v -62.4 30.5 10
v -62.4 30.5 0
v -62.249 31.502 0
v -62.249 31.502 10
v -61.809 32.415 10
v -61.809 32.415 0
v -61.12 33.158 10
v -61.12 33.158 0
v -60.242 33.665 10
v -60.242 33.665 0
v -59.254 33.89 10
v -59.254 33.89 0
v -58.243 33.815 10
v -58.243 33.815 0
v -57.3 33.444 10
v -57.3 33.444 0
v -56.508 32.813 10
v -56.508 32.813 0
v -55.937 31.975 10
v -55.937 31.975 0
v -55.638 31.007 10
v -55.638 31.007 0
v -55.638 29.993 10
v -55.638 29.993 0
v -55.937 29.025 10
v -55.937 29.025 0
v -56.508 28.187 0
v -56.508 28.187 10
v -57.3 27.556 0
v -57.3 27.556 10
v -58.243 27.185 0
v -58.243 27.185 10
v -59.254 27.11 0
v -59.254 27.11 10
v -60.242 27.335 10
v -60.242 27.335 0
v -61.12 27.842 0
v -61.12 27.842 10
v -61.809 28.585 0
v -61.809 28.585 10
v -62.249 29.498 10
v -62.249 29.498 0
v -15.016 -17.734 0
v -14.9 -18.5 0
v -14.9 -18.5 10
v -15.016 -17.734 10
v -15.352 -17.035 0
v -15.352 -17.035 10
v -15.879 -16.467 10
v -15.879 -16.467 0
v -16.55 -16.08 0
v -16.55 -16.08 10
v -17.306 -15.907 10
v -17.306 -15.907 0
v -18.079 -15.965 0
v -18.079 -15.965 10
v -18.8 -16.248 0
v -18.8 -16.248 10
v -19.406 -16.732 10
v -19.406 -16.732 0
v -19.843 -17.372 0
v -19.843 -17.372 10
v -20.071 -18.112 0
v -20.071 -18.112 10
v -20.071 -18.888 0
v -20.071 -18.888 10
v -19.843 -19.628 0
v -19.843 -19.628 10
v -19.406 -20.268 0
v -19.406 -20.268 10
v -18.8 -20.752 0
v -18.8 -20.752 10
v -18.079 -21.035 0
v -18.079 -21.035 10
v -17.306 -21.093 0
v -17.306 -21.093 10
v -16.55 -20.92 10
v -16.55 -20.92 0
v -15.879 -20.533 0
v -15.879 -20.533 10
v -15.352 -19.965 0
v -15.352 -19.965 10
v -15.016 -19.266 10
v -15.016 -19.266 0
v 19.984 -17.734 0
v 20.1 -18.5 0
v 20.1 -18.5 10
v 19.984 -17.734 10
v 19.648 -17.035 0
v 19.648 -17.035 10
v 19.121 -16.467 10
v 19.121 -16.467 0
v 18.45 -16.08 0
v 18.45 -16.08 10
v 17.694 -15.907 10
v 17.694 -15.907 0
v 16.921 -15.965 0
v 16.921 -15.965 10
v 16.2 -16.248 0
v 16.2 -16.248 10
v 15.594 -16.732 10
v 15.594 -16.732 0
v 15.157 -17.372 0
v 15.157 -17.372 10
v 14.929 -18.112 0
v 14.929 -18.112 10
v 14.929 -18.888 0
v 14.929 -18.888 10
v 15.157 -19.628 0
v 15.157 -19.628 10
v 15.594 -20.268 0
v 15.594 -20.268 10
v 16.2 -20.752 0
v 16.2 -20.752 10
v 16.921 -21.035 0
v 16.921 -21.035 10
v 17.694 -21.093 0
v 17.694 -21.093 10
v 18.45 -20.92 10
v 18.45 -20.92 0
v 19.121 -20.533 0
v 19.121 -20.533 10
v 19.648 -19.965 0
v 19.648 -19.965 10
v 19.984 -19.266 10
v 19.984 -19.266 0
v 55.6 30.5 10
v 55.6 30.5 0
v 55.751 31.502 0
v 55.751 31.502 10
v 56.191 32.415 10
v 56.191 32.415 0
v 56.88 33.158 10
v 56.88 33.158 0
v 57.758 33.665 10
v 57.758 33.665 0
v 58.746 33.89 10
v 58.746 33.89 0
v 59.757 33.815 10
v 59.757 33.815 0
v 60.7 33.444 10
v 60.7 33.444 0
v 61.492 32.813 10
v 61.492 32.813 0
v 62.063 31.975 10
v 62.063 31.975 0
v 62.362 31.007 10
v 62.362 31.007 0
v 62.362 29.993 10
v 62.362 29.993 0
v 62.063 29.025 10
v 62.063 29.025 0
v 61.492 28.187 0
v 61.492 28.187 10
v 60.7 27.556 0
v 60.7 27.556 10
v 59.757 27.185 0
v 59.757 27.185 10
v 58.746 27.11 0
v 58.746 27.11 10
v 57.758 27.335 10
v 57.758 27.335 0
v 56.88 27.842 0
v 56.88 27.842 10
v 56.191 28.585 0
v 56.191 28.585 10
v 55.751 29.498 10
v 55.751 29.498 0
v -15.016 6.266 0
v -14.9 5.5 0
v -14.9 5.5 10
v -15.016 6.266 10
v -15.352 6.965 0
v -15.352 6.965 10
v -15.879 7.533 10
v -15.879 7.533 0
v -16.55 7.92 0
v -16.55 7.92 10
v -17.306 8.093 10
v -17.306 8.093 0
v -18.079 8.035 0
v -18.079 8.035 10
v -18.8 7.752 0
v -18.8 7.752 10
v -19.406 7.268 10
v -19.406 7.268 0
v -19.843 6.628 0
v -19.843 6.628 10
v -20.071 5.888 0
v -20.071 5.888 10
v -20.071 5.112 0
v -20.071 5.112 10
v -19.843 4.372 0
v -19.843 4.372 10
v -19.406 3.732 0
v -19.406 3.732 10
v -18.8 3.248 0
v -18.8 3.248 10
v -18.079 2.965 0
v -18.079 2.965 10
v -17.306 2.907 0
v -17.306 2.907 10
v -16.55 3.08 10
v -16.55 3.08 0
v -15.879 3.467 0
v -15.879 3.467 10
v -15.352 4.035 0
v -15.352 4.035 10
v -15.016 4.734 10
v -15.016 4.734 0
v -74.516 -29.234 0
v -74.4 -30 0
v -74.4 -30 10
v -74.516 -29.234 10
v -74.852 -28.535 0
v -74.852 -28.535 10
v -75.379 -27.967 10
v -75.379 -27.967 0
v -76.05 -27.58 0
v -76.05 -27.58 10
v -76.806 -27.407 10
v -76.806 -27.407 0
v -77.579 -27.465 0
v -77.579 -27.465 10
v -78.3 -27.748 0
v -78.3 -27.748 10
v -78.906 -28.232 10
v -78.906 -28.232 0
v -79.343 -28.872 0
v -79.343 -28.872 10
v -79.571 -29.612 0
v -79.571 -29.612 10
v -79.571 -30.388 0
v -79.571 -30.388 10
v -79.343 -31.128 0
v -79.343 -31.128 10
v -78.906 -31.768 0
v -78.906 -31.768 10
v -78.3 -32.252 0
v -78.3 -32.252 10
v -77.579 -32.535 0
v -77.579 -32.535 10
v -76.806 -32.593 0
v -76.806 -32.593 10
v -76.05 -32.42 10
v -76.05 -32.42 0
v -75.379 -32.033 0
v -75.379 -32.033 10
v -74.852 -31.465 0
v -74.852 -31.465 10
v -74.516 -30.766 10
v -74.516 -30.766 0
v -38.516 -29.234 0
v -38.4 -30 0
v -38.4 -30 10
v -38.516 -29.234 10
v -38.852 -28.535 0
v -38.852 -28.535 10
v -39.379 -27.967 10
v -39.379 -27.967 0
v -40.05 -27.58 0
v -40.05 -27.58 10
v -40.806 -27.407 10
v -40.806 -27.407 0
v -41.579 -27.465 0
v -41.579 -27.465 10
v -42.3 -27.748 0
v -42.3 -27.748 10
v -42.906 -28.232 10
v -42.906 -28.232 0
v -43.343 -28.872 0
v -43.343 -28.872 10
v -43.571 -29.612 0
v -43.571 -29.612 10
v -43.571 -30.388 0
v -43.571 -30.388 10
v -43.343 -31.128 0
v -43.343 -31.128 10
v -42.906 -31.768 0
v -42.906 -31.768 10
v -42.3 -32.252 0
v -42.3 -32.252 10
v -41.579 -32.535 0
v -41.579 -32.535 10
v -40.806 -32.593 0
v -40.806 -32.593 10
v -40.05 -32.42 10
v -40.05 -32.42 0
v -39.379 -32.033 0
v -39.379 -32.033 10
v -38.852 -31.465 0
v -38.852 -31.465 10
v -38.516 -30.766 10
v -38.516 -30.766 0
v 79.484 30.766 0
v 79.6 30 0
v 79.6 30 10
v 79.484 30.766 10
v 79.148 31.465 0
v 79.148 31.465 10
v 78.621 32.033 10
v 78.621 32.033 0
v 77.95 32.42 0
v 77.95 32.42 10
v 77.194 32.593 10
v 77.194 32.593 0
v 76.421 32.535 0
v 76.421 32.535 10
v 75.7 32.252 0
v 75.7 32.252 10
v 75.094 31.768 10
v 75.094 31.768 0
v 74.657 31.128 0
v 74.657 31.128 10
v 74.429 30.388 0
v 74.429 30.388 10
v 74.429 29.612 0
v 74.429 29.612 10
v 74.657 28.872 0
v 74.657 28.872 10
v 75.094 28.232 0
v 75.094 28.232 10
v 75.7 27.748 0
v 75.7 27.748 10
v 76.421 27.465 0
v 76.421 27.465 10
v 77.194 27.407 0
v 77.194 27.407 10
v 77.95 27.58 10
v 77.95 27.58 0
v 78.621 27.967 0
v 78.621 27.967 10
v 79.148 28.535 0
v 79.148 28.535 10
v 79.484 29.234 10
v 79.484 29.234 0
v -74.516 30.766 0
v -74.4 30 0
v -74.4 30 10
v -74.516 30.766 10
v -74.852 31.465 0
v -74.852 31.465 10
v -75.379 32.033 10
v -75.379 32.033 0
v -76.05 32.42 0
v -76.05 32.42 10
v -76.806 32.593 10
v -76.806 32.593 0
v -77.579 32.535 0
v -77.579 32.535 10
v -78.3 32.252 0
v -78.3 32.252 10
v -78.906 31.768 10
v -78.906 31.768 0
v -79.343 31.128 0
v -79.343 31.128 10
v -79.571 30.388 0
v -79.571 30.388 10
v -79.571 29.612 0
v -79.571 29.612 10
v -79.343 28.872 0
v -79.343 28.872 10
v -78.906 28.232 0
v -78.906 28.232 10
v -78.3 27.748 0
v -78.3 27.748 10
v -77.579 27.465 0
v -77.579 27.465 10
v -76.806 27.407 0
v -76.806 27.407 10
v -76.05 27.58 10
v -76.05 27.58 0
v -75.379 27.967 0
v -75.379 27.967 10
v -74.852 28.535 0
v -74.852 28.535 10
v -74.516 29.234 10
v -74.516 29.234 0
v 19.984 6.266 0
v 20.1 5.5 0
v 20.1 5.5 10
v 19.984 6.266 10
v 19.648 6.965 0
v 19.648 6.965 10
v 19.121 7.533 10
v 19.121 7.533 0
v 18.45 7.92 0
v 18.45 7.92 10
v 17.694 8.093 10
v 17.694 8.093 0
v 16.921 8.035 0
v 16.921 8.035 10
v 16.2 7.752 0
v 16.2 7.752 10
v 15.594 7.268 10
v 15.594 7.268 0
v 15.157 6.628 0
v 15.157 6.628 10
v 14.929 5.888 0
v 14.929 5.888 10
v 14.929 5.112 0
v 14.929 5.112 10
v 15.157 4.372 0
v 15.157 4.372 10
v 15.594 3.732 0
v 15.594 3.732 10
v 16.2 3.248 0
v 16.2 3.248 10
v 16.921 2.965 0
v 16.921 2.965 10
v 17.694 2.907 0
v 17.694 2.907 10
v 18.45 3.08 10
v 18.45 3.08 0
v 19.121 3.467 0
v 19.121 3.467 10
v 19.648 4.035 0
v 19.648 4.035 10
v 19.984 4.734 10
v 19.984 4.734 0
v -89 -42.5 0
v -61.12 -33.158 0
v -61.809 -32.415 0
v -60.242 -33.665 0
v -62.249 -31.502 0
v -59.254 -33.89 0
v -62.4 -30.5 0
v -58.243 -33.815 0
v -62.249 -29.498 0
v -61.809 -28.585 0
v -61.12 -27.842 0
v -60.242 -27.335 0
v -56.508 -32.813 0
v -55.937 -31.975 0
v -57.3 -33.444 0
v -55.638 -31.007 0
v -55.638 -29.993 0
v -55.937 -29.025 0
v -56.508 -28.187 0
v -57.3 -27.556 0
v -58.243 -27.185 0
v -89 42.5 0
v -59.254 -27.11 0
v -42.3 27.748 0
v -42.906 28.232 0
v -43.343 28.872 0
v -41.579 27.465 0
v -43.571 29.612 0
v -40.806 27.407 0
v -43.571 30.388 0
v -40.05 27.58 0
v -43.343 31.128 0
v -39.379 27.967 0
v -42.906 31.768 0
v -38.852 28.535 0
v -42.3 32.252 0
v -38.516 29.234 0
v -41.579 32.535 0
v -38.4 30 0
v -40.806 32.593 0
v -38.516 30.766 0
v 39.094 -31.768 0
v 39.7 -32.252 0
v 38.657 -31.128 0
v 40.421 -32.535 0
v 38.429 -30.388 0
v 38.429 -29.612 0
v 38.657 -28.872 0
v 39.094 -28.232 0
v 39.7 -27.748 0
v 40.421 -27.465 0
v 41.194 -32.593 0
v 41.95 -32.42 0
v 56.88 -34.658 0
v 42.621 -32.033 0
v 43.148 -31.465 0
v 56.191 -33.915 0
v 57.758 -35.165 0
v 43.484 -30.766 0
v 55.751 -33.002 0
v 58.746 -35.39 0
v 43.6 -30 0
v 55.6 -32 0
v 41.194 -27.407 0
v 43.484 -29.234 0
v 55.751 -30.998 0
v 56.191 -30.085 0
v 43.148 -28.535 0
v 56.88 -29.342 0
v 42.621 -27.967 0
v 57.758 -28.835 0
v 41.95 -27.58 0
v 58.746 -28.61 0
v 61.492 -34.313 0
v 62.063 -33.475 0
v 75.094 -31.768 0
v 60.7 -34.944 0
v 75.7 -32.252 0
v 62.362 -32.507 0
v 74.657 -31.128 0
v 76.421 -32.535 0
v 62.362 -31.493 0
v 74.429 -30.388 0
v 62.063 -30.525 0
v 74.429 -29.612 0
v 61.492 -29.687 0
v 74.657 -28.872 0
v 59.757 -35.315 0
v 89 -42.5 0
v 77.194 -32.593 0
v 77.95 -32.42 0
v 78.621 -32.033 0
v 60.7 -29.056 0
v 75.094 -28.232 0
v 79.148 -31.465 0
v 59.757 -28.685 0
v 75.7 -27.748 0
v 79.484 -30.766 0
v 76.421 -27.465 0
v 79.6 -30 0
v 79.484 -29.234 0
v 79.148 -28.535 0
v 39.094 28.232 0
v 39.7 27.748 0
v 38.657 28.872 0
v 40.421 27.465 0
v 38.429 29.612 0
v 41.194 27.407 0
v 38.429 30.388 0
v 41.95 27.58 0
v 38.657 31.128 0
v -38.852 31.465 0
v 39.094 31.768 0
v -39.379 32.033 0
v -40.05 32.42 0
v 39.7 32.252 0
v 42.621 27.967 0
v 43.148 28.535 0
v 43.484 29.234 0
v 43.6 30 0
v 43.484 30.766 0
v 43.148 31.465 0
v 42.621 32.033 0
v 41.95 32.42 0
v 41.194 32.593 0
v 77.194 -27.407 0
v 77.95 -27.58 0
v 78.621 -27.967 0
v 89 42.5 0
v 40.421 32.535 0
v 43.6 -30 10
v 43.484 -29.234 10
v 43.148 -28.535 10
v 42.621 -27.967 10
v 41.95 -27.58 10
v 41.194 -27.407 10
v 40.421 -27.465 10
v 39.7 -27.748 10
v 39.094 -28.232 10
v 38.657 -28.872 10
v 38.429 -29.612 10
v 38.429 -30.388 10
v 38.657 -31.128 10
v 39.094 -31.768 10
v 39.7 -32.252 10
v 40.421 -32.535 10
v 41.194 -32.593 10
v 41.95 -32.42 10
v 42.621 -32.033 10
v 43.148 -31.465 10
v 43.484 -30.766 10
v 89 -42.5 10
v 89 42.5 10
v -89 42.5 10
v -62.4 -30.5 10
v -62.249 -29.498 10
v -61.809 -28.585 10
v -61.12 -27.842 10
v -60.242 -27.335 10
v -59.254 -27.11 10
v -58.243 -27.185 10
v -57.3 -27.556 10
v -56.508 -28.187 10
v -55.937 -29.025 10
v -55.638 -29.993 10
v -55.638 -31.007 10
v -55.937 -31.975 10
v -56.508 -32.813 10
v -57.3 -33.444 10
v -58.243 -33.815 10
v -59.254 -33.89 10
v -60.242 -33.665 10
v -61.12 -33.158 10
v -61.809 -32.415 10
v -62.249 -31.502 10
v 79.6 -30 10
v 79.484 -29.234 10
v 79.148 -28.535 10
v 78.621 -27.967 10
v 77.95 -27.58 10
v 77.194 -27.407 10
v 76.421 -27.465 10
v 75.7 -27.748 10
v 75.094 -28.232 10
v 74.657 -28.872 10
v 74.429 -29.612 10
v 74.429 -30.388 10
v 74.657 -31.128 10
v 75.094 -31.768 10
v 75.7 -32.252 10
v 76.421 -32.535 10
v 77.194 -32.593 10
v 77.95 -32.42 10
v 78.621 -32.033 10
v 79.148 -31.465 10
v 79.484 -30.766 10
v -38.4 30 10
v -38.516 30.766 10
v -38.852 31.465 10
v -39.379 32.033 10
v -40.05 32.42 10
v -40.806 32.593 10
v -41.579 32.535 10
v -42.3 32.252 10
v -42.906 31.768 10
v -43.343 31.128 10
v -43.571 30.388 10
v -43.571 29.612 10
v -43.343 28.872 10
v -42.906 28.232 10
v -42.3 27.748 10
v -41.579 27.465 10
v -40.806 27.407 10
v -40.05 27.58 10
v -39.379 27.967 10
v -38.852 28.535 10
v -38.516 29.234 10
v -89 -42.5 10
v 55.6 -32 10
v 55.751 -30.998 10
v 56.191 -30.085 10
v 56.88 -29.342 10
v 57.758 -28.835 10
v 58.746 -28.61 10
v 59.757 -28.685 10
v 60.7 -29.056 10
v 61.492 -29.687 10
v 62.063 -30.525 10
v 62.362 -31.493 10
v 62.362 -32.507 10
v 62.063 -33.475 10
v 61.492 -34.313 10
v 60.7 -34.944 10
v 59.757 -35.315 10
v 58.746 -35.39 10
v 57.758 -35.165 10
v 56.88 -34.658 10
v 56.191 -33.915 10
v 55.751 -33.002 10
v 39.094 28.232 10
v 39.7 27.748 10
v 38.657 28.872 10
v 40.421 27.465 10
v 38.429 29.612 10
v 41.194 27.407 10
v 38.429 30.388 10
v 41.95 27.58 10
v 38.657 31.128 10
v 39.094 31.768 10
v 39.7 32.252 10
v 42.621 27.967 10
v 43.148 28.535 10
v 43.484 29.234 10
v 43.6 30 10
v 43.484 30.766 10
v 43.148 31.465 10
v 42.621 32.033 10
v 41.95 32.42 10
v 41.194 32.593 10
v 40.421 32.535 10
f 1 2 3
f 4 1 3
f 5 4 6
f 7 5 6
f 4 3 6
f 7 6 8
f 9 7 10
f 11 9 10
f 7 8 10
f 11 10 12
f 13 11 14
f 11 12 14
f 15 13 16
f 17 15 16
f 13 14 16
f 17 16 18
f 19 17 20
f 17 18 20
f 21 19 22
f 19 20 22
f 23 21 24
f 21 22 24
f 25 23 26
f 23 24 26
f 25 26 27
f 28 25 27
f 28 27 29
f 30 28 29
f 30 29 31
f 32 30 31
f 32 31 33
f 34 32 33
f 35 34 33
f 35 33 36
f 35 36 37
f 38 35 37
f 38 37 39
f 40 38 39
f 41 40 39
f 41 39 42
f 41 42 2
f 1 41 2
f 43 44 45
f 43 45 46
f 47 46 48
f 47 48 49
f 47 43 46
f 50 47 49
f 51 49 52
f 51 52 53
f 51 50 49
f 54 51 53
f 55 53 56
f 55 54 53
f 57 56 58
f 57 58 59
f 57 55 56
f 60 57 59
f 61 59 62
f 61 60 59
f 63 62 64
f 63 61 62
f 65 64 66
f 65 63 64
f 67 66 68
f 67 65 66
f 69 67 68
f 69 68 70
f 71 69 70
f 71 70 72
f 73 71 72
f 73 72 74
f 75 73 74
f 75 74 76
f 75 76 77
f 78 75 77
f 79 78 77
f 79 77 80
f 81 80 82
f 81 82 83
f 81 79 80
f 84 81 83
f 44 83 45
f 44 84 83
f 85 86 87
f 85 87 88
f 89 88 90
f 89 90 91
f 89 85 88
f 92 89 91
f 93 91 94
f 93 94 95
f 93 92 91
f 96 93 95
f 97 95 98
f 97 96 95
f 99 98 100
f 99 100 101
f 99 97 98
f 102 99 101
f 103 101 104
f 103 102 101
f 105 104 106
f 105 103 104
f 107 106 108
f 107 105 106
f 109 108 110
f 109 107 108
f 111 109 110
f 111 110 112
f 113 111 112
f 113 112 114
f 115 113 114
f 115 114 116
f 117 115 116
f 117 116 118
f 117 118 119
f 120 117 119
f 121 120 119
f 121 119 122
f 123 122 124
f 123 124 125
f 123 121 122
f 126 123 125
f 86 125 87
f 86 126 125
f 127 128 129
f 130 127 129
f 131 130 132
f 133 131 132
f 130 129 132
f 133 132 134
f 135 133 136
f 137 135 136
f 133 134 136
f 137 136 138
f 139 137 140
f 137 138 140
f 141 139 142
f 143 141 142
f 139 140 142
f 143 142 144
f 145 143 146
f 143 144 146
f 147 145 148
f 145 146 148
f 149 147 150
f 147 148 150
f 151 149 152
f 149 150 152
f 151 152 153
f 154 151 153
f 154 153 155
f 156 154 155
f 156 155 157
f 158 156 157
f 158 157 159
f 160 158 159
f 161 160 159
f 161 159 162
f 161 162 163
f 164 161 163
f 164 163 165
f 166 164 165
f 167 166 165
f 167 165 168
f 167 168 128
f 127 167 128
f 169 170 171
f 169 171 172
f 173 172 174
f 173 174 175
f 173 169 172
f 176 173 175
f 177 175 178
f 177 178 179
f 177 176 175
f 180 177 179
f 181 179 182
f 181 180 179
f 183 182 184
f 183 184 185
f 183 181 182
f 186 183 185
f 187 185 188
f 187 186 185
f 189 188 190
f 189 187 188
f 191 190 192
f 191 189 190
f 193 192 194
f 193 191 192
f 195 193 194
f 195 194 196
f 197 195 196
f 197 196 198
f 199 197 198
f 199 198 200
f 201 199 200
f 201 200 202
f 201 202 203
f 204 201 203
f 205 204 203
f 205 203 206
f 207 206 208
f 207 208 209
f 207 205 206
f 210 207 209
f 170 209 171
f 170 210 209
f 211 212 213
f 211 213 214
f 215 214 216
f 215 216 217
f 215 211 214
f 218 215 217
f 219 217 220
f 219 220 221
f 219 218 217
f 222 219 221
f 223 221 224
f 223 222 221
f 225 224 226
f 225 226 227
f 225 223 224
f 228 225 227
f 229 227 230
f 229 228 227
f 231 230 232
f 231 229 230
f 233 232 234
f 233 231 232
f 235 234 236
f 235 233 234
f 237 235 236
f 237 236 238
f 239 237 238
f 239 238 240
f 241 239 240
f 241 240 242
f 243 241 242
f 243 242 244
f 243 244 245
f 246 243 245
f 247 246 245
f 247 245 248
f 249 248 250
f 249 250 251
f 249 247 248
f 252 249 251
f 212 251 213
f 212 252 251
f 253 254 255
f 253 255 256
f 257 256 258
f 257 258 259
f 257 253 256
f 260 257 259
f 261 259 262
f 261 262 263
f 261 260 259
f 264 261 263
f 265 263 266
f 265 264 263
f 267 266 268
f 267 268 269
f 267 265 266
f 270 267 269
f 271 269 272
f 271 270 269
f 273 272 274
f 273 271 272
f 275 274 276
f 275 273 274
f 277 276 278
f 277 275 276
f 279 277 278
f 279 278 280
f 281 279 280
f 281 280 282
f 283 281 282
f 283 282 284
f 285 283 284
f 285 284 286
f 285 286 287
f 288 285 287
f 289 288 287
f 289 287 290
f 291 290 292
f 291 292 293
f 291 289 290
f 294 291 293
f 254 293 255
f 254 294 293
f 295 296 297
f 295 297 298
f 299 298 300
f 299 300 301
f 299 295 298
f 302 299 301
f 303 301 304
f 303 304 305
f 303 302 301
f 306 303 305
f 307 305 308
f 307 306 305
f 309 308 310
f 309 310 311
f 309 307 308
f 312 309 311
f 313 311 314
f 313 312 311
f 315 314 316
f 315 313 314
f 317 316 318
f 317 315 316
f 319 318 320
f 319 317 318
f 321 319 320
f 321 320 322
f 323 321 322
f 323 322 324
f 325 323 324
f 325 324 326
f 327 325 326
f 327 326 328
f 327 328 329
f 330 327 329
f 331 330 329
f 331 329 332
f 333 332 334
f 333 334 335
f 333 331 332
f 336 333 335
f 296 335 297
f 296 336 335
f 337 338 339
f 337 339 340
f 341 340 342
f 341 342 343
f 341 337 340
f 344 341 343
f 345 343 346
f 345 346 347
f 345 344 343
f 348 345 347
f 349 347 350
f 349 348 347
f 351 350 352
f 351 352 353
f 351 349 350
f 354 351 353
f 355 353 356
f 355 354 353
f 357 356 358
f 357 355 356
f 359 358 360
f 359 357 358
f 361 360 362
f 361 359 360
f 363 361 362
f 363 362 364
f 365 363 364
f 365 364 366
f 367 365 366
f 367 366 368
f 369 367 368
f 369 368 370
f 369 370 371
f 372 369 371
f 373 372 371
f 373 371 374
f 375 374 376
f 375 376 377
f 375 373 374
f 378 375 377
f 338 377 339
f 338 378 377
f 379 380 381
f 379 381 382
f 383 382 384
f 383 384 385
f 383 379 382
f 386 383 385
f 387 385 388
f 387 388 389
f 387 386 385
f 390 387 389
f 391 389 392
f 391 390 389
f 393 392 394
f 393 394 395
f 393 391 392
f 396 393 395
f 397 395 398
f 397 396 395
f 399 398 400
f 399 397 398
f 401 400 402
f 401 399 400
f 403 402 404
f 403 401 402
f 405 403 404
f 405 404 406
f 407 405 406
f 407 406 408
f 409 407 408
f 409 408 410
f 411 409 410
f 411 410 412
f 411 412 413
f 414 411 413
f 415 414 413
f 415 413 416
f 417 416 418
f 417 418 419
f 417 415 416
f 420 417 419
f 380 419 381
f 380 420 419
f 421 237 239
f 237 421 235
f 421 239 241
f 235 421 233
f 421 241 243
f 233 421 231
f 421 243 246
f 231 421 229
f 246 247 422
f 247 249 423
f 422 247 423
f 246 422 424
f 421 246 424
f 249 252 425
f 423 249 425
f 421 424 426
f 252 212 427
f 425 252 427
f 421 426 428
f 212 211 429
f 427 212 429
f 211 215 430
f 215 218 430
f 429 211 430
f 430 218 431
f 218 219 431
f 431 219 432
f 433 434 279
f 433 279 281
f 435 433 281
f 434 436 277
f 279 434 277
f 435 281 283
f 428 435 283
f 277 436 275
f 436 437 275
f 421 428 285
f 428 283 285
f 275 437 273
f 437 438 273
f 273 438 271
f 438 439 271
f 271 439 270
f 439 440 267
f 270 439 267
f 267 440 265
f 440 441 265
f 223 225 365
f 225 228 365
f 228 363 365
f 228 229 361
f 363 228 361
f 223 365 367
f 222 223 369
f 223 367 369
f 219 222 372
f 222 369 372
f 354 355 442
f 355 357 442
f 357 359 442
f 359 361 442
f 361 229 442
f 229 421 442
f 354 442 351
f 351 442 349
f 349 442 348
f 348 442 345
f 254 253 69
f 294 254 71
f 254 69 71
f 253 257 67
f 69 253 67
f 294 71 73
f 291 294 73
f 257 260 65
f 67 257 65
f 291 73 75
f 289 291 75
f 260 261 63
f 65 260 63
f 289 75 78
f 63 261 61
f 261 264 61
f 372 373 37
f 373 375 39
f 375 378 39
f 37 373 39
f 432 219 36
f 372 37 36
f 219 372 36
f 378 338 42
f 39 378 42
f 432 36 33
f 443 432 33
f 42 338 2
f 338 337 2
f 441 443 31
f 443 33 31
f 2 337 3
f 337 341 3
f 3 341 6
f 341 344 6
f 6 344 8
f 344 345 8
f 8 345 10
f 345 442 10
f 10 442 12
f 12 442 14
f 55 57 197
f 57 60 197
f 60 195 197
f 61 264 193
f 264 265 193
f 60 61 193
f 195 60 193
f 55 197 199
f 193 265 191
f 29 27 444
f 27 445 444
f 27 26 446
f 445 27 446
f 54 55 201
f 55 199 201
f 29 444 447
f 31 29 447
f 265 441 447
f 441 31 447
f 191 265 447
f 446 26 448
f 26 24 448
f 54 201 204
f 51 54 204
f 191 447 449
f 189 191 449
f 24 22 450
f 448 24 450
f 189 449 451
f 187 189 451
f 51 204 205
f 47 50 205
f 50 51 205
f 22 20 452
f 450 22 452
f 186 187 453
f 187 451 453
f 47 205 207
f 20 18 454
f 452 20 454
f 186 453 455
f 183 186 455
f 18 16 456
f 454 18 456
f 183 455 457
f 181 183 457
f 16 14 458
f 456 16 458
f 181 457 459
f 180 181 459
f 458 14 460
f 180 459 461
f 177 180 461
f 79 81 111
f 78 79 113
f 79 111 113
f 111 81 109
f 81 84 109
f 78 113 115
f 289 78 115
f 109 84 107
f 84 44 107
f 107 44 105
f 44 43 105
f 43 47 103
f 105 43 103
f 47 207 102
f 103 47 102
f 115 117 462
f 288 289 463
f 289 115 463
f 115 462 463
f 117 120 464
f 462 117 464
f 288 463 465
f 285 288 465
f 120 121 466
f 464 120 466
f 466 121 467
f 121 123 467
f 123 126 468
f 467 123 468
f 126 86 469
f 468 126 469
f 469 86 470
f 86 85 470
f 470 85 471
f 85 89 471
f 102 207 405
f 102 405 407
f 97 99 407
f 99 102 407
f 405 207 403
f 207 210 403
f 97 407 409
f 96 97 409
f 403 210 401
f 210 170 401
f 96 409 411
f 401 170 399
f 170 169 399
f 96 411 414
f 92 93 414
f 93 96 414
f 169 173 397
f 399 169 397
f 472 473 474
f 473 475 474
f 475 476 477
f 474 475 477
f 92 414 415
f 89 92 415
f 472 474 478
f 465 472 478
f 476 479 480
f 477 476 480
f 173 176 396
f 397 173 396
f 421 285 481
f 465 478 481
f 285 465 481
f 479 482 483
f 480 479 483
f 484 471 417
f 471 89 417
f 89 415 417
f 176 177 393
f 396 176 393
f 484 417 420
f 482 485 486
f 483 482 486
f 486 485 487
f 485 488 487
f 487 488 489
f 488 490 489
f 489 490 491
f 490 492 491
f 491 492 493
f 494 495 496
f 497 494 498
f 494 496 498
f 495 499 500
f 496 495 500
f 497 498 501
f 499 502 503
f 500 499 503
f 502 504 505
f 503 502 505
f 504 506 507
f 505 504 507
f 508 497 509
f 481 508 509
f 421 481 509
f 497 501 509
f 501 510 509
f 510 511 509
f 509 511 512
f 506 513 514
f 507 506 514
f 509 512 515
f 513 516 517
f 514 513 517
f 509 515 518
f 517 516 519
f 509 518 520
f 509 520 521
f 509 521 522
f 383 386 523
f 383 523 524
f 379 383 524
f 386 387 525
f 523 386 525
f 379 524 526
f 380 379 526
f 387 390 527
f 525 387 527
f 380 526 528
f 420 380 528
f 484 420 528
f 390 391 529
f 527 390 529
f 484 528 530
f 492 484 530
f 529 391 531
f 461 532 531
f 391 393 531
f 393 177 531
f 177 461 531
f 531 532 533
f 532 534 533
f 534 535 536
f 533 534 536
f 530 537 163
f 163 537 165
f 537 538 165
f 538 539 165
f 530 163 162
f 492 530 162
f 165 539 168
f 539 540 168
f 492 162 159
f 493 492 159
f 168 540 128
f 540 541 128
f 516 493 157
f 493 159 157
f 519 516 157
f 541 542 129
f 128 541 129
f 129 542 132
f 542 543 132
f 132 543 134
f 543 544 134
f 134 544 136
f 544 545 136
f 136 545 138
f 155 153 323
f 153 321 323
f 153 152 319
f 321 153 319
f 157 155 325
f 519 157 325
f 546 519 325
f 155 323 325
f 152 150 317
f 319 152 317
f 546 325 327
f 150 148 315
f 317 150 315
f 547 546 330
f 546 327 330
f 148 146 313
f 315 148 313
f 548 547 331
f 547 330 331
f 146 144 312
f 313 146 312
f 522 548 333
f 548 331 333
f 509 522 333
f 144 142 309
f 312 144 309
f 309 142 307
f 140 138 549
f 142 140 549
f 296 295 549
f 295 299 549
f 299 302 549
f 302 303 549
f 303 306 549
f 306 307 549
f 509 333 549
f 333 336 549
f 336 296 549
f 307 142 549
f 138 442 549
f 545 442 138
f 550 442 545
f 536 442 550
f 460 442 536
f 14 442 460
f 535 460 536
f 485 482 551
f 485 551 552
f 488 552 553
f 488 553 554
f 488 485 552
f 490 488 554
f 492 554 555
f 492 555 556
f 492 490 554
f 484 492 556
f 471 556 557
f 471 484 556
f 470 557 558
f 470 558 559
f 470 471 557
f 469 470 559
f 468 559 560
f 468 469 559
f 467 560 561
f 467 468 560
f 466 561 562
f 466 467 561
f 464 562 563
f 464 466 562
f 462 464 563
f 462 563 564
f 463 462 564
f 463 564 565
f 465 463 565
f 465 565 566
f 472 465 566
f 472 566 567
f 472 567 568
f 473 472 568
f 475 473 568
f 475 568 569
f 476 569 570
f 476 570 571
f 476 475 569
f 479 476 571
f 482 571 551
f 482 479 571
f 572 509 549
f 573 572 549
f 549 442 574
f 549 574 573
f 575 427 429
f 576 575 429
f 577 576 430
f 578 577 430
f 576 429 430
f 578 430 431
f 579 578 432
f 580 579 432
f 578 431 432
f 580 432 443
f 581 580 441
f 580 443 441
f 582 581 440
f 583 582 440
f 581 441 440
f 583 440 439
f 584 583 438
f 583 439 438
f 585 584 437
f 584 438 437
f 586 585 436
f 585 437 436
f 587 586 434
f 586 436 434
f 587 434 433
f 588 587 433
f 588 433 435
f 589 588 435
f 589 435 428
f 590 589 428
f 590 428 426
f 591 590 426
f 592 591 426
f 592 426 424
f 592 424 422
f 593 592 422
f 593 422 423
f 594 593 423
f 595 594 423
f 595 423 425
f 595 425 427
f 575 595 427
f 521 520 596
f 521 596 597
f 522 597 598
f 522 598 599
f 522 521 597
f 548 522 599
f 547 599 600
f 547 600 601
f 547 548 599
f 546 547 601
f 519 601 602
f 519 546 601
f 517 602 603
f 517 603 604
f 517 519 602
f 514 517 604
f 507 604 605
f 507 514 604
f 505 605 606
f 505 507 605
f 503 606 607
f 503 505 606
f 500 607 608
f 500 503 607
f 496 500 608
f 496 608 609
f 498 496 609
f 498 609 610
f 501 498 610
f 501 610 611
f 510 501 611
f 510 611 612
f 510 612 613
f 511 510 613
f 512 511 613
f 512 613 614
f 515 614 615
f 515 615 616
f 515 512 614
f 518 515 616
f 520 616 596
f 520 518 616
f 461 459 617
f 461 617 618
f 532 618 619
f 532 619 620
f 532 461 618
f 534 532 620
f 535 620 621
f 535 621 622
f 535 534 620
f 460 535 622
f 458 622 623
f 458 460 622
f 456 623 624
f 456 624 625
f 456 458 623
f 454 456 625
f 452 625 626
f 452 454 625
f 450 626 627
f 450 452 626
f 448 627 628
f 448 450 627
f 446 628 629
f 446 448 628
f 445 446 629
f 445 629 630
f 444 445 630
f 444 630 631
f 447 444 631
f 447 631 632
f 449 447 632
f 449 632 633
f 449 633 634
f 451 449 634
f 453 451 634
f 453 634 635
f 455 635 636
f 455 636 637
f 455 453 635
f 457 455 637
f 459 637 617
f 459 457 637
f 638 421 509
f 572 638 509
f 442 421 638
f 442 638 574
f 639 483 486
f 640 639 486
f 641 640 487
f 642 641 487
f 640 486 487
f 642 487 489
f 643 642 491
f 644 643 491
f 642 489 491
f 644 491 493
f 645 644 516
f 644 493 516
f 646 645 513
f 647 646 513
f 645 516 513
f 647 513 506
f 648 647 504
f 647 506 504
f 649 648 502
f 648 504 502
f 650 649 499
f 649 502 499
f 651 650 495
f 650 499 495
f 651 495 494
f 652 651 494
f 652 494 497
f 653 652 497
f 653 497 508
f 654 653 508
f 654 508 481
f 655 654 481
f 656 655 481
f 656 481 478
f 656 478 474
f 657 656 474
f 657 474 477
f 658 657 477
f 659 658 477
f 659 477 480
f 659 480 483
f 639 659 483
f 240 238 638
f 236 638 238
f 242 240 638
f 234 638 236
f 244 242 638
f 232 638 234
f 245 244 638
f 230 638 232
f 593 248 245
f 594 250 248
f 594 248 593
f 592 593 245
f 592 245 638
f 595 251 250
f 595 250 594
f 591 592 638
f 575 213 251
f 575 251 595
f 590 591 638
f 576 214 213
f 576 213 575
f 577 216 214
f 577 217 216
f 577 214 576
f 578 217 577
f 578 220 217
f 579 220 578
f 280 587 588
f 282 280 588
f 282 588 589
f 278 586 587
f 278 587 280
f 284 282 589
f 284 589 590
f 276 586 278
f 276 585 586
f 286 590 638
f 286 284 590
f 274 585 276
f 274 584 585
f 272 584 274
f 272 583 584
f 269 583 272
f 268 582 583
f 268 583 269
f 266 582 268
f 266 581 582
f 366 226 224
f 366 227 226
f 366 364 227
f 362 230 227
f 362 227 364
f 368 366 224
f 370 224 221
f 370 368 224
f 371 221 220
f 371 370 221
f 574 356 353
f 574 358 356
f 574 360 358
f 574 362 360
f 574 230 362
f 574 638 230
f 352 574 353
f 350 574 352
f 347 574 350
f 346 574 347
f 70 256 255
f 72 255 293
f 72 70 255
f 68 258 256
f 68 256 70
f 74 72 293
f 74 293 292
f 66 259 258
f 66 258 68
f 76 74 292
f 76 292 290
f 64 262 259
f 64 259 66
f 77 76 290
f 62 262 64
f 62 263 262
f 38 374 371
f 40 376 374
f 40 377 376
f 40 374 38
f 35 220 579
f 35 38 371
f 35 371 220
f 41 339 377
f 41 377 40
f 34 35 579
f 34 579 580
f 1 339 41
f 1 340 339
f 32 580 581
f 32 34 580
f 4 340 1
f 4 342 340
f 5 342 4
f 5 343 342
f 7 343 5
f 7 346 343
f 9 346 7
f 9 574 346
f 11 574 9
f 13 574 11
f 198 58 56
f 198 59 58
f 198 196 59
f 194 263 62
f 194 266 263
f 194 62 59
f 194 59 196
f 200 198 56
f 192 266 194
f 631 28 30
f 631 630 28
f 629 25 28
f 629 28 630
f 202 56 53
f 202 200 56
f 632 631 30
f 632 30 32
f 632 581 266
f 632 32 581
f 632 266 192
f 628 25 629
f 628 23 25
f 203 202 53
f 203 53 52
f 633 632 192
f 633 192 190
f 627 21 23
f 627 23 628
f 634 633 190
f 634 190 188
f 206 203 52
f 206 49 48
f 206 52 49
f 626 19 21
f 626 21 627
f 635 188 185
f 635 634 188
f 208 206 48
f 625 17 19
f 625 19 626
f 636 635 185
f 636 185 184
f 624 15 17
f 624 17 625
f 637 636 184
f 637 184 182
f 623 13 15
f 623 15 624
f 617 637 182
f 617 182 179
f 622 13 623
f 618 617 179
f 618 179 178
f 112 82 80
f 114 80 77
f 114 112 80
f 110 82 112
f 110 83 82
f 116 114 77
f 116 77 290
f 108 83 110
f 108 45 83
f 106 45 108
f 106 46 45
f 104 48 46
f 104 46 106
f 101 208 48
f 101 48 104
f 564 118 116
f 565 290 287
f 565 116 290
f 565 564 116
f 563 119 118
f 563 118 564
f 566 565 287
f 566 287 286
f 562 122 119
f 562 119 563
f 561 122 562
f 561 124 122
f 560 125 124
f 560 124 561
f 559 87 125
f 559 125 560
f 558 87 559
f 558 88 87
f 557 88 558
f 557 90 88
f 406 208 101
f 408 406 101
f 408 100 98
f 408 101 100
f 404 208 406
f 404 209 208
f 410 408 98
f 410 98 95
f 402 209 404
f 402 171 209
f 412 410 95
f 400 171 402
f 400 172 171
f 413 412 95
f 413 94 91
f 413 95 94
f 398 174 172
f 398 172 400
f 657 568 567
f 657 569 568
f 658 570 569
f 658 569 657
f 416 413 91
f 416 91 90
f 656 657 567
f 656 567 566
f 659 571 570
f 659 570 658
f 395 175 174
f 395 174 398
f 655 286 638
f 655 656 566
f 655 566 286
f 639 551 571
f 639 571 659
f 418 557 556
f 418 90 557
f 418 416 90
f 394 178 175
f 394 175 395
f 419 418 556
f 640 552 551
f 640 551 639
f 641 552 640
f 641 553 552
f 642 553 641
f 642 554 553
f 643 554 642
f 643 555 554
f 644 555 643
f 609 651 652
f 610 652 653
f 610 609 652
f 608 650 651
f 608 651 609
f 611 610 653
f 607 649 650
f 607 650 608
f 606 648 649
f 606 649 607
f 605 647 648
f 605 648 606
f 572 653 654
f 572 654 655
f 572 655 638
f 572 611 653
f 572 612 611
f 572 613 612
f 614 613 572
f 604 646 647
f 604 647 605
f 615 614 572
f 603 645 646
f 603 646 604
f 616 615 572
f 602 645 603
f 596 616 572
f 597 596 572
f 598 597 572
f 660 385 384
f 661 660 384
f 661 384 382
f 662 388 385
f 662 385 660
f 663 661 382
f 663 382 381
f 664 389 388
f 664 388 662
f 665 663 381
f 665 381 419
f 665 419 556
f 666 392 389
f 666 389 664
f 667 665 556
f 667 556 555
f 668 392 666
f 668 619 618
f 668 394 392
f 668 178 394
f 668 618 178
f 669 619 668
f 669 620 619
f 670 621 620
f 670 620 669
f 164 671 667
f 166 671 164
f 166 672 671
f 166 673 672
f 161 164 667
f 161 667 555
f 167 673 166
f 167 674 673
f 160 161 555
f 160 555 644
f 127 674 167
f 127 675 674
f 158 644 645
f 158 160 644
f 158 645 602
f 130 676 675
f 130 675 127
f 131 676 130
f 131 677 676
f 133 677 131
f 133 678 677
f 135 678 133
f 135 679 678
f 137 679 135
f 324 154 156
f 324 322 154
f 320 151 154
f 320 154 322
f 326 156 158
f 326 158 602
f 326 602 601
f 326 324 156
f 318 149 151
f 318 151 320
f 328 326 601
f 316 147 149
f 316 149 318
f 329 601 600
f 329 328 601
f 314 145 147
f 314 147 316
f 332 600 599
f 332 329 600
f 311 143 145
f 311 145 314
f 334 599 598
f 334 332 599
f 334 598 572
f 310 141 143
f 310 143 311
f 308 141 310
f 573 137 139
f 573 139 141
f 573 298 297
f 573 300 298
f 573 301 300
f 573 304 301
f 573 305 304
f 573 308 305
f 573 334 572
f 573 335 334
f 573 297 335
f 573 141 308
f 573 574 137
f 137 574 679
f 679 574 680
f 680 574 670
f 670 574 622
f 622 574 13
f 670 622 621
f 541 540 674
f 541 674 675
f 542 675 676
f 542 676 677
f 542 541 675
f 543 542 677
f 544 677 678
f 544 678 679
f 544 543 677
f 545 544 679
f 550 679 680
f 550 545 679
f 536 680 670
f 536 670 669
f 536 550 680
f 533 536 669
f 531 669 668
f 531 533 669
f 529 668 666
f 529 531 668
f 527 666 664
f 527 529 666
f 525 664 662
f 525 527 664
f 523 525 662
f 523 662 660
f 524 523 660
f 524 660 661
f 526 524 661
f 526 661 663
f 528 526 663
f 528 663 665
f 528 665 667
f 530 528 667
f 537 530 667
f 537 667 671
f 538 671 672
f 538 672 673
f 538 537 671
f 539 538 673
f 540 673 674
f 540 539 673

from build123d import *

# Parameters (mm, degrees)
SKETCH1_W           = 178
SKETCH1_H           = 85
SKETCH1_R           = 2.6
BOSS_EXTRUDE1_DEPTH = 10
M8_TAPPED_HOLE1_D   = 6.8


with BuildPart() as part:
    # Sketch1 → Boss-Extrude1 (new body)
    with BuildSketch(Plane.XY):
        Rectangle(SKETCH1_W, SKETCH1_H)
        with Locations((-77, -30)):
            Circle(SKETCH1_R, mode=Mode.SUBTRACT)
        with Locations((-41, -30)):
            Circle(SKETCH1_R, mode=Mode.SUBTRACT)
        with Locations((-41, 30)):
            Circle(SKETCH1_R, mode=Mode.SUBTRACT)
        with Locations((-77, 30)):
            Circle(SKETCH1_R, mode=Mode.SUBTRACT)
        with Locations((-17.5, -18.5)):
            Circle(SKETCH1_R, mode=Mode.SUBTRACT)
        with Locations((17.5, -18.5)):
            Circle(SKETCH1_R, mode=Mode.SUBTRACT)
        with Locations((17.5, 5.5)):
            Circle(SKETCH1_R, mode=Mode.SUBTRACT)
        with Locations((-17.5, 5.5)):
            Circle(SKETCH1_R, mode=Mode.SUBTRACT)
        with Locations((77, -30)):
            Circle(SKETCH1_R, mode=Mode.SUBTRACT)
        with Locations((41, -30)):
            Circle(SKETCH1_R, mode=Mode.SUBTRACT)
        with Locations((41, 30)):
            Circle(SKETCH1_R, mode=Mode.SUBTRACT)
        with Locations((77, 30)):
            Circle(SKETCH1_R, mode=Mode.SUBTRACT)
    extrude(amount=BOSS_EXTRUDE1_DEPTH)

    # M8 Tapped Hole1 (through all)
    with Locations(Plane.XY.offset(10)):
        with Locations((59, 30.5), (-59, 30.5), (-59, -30.5), (59, -32)):
            Hole(M8_TAPPED_HOLE1_D / 2)


solid = part.part
